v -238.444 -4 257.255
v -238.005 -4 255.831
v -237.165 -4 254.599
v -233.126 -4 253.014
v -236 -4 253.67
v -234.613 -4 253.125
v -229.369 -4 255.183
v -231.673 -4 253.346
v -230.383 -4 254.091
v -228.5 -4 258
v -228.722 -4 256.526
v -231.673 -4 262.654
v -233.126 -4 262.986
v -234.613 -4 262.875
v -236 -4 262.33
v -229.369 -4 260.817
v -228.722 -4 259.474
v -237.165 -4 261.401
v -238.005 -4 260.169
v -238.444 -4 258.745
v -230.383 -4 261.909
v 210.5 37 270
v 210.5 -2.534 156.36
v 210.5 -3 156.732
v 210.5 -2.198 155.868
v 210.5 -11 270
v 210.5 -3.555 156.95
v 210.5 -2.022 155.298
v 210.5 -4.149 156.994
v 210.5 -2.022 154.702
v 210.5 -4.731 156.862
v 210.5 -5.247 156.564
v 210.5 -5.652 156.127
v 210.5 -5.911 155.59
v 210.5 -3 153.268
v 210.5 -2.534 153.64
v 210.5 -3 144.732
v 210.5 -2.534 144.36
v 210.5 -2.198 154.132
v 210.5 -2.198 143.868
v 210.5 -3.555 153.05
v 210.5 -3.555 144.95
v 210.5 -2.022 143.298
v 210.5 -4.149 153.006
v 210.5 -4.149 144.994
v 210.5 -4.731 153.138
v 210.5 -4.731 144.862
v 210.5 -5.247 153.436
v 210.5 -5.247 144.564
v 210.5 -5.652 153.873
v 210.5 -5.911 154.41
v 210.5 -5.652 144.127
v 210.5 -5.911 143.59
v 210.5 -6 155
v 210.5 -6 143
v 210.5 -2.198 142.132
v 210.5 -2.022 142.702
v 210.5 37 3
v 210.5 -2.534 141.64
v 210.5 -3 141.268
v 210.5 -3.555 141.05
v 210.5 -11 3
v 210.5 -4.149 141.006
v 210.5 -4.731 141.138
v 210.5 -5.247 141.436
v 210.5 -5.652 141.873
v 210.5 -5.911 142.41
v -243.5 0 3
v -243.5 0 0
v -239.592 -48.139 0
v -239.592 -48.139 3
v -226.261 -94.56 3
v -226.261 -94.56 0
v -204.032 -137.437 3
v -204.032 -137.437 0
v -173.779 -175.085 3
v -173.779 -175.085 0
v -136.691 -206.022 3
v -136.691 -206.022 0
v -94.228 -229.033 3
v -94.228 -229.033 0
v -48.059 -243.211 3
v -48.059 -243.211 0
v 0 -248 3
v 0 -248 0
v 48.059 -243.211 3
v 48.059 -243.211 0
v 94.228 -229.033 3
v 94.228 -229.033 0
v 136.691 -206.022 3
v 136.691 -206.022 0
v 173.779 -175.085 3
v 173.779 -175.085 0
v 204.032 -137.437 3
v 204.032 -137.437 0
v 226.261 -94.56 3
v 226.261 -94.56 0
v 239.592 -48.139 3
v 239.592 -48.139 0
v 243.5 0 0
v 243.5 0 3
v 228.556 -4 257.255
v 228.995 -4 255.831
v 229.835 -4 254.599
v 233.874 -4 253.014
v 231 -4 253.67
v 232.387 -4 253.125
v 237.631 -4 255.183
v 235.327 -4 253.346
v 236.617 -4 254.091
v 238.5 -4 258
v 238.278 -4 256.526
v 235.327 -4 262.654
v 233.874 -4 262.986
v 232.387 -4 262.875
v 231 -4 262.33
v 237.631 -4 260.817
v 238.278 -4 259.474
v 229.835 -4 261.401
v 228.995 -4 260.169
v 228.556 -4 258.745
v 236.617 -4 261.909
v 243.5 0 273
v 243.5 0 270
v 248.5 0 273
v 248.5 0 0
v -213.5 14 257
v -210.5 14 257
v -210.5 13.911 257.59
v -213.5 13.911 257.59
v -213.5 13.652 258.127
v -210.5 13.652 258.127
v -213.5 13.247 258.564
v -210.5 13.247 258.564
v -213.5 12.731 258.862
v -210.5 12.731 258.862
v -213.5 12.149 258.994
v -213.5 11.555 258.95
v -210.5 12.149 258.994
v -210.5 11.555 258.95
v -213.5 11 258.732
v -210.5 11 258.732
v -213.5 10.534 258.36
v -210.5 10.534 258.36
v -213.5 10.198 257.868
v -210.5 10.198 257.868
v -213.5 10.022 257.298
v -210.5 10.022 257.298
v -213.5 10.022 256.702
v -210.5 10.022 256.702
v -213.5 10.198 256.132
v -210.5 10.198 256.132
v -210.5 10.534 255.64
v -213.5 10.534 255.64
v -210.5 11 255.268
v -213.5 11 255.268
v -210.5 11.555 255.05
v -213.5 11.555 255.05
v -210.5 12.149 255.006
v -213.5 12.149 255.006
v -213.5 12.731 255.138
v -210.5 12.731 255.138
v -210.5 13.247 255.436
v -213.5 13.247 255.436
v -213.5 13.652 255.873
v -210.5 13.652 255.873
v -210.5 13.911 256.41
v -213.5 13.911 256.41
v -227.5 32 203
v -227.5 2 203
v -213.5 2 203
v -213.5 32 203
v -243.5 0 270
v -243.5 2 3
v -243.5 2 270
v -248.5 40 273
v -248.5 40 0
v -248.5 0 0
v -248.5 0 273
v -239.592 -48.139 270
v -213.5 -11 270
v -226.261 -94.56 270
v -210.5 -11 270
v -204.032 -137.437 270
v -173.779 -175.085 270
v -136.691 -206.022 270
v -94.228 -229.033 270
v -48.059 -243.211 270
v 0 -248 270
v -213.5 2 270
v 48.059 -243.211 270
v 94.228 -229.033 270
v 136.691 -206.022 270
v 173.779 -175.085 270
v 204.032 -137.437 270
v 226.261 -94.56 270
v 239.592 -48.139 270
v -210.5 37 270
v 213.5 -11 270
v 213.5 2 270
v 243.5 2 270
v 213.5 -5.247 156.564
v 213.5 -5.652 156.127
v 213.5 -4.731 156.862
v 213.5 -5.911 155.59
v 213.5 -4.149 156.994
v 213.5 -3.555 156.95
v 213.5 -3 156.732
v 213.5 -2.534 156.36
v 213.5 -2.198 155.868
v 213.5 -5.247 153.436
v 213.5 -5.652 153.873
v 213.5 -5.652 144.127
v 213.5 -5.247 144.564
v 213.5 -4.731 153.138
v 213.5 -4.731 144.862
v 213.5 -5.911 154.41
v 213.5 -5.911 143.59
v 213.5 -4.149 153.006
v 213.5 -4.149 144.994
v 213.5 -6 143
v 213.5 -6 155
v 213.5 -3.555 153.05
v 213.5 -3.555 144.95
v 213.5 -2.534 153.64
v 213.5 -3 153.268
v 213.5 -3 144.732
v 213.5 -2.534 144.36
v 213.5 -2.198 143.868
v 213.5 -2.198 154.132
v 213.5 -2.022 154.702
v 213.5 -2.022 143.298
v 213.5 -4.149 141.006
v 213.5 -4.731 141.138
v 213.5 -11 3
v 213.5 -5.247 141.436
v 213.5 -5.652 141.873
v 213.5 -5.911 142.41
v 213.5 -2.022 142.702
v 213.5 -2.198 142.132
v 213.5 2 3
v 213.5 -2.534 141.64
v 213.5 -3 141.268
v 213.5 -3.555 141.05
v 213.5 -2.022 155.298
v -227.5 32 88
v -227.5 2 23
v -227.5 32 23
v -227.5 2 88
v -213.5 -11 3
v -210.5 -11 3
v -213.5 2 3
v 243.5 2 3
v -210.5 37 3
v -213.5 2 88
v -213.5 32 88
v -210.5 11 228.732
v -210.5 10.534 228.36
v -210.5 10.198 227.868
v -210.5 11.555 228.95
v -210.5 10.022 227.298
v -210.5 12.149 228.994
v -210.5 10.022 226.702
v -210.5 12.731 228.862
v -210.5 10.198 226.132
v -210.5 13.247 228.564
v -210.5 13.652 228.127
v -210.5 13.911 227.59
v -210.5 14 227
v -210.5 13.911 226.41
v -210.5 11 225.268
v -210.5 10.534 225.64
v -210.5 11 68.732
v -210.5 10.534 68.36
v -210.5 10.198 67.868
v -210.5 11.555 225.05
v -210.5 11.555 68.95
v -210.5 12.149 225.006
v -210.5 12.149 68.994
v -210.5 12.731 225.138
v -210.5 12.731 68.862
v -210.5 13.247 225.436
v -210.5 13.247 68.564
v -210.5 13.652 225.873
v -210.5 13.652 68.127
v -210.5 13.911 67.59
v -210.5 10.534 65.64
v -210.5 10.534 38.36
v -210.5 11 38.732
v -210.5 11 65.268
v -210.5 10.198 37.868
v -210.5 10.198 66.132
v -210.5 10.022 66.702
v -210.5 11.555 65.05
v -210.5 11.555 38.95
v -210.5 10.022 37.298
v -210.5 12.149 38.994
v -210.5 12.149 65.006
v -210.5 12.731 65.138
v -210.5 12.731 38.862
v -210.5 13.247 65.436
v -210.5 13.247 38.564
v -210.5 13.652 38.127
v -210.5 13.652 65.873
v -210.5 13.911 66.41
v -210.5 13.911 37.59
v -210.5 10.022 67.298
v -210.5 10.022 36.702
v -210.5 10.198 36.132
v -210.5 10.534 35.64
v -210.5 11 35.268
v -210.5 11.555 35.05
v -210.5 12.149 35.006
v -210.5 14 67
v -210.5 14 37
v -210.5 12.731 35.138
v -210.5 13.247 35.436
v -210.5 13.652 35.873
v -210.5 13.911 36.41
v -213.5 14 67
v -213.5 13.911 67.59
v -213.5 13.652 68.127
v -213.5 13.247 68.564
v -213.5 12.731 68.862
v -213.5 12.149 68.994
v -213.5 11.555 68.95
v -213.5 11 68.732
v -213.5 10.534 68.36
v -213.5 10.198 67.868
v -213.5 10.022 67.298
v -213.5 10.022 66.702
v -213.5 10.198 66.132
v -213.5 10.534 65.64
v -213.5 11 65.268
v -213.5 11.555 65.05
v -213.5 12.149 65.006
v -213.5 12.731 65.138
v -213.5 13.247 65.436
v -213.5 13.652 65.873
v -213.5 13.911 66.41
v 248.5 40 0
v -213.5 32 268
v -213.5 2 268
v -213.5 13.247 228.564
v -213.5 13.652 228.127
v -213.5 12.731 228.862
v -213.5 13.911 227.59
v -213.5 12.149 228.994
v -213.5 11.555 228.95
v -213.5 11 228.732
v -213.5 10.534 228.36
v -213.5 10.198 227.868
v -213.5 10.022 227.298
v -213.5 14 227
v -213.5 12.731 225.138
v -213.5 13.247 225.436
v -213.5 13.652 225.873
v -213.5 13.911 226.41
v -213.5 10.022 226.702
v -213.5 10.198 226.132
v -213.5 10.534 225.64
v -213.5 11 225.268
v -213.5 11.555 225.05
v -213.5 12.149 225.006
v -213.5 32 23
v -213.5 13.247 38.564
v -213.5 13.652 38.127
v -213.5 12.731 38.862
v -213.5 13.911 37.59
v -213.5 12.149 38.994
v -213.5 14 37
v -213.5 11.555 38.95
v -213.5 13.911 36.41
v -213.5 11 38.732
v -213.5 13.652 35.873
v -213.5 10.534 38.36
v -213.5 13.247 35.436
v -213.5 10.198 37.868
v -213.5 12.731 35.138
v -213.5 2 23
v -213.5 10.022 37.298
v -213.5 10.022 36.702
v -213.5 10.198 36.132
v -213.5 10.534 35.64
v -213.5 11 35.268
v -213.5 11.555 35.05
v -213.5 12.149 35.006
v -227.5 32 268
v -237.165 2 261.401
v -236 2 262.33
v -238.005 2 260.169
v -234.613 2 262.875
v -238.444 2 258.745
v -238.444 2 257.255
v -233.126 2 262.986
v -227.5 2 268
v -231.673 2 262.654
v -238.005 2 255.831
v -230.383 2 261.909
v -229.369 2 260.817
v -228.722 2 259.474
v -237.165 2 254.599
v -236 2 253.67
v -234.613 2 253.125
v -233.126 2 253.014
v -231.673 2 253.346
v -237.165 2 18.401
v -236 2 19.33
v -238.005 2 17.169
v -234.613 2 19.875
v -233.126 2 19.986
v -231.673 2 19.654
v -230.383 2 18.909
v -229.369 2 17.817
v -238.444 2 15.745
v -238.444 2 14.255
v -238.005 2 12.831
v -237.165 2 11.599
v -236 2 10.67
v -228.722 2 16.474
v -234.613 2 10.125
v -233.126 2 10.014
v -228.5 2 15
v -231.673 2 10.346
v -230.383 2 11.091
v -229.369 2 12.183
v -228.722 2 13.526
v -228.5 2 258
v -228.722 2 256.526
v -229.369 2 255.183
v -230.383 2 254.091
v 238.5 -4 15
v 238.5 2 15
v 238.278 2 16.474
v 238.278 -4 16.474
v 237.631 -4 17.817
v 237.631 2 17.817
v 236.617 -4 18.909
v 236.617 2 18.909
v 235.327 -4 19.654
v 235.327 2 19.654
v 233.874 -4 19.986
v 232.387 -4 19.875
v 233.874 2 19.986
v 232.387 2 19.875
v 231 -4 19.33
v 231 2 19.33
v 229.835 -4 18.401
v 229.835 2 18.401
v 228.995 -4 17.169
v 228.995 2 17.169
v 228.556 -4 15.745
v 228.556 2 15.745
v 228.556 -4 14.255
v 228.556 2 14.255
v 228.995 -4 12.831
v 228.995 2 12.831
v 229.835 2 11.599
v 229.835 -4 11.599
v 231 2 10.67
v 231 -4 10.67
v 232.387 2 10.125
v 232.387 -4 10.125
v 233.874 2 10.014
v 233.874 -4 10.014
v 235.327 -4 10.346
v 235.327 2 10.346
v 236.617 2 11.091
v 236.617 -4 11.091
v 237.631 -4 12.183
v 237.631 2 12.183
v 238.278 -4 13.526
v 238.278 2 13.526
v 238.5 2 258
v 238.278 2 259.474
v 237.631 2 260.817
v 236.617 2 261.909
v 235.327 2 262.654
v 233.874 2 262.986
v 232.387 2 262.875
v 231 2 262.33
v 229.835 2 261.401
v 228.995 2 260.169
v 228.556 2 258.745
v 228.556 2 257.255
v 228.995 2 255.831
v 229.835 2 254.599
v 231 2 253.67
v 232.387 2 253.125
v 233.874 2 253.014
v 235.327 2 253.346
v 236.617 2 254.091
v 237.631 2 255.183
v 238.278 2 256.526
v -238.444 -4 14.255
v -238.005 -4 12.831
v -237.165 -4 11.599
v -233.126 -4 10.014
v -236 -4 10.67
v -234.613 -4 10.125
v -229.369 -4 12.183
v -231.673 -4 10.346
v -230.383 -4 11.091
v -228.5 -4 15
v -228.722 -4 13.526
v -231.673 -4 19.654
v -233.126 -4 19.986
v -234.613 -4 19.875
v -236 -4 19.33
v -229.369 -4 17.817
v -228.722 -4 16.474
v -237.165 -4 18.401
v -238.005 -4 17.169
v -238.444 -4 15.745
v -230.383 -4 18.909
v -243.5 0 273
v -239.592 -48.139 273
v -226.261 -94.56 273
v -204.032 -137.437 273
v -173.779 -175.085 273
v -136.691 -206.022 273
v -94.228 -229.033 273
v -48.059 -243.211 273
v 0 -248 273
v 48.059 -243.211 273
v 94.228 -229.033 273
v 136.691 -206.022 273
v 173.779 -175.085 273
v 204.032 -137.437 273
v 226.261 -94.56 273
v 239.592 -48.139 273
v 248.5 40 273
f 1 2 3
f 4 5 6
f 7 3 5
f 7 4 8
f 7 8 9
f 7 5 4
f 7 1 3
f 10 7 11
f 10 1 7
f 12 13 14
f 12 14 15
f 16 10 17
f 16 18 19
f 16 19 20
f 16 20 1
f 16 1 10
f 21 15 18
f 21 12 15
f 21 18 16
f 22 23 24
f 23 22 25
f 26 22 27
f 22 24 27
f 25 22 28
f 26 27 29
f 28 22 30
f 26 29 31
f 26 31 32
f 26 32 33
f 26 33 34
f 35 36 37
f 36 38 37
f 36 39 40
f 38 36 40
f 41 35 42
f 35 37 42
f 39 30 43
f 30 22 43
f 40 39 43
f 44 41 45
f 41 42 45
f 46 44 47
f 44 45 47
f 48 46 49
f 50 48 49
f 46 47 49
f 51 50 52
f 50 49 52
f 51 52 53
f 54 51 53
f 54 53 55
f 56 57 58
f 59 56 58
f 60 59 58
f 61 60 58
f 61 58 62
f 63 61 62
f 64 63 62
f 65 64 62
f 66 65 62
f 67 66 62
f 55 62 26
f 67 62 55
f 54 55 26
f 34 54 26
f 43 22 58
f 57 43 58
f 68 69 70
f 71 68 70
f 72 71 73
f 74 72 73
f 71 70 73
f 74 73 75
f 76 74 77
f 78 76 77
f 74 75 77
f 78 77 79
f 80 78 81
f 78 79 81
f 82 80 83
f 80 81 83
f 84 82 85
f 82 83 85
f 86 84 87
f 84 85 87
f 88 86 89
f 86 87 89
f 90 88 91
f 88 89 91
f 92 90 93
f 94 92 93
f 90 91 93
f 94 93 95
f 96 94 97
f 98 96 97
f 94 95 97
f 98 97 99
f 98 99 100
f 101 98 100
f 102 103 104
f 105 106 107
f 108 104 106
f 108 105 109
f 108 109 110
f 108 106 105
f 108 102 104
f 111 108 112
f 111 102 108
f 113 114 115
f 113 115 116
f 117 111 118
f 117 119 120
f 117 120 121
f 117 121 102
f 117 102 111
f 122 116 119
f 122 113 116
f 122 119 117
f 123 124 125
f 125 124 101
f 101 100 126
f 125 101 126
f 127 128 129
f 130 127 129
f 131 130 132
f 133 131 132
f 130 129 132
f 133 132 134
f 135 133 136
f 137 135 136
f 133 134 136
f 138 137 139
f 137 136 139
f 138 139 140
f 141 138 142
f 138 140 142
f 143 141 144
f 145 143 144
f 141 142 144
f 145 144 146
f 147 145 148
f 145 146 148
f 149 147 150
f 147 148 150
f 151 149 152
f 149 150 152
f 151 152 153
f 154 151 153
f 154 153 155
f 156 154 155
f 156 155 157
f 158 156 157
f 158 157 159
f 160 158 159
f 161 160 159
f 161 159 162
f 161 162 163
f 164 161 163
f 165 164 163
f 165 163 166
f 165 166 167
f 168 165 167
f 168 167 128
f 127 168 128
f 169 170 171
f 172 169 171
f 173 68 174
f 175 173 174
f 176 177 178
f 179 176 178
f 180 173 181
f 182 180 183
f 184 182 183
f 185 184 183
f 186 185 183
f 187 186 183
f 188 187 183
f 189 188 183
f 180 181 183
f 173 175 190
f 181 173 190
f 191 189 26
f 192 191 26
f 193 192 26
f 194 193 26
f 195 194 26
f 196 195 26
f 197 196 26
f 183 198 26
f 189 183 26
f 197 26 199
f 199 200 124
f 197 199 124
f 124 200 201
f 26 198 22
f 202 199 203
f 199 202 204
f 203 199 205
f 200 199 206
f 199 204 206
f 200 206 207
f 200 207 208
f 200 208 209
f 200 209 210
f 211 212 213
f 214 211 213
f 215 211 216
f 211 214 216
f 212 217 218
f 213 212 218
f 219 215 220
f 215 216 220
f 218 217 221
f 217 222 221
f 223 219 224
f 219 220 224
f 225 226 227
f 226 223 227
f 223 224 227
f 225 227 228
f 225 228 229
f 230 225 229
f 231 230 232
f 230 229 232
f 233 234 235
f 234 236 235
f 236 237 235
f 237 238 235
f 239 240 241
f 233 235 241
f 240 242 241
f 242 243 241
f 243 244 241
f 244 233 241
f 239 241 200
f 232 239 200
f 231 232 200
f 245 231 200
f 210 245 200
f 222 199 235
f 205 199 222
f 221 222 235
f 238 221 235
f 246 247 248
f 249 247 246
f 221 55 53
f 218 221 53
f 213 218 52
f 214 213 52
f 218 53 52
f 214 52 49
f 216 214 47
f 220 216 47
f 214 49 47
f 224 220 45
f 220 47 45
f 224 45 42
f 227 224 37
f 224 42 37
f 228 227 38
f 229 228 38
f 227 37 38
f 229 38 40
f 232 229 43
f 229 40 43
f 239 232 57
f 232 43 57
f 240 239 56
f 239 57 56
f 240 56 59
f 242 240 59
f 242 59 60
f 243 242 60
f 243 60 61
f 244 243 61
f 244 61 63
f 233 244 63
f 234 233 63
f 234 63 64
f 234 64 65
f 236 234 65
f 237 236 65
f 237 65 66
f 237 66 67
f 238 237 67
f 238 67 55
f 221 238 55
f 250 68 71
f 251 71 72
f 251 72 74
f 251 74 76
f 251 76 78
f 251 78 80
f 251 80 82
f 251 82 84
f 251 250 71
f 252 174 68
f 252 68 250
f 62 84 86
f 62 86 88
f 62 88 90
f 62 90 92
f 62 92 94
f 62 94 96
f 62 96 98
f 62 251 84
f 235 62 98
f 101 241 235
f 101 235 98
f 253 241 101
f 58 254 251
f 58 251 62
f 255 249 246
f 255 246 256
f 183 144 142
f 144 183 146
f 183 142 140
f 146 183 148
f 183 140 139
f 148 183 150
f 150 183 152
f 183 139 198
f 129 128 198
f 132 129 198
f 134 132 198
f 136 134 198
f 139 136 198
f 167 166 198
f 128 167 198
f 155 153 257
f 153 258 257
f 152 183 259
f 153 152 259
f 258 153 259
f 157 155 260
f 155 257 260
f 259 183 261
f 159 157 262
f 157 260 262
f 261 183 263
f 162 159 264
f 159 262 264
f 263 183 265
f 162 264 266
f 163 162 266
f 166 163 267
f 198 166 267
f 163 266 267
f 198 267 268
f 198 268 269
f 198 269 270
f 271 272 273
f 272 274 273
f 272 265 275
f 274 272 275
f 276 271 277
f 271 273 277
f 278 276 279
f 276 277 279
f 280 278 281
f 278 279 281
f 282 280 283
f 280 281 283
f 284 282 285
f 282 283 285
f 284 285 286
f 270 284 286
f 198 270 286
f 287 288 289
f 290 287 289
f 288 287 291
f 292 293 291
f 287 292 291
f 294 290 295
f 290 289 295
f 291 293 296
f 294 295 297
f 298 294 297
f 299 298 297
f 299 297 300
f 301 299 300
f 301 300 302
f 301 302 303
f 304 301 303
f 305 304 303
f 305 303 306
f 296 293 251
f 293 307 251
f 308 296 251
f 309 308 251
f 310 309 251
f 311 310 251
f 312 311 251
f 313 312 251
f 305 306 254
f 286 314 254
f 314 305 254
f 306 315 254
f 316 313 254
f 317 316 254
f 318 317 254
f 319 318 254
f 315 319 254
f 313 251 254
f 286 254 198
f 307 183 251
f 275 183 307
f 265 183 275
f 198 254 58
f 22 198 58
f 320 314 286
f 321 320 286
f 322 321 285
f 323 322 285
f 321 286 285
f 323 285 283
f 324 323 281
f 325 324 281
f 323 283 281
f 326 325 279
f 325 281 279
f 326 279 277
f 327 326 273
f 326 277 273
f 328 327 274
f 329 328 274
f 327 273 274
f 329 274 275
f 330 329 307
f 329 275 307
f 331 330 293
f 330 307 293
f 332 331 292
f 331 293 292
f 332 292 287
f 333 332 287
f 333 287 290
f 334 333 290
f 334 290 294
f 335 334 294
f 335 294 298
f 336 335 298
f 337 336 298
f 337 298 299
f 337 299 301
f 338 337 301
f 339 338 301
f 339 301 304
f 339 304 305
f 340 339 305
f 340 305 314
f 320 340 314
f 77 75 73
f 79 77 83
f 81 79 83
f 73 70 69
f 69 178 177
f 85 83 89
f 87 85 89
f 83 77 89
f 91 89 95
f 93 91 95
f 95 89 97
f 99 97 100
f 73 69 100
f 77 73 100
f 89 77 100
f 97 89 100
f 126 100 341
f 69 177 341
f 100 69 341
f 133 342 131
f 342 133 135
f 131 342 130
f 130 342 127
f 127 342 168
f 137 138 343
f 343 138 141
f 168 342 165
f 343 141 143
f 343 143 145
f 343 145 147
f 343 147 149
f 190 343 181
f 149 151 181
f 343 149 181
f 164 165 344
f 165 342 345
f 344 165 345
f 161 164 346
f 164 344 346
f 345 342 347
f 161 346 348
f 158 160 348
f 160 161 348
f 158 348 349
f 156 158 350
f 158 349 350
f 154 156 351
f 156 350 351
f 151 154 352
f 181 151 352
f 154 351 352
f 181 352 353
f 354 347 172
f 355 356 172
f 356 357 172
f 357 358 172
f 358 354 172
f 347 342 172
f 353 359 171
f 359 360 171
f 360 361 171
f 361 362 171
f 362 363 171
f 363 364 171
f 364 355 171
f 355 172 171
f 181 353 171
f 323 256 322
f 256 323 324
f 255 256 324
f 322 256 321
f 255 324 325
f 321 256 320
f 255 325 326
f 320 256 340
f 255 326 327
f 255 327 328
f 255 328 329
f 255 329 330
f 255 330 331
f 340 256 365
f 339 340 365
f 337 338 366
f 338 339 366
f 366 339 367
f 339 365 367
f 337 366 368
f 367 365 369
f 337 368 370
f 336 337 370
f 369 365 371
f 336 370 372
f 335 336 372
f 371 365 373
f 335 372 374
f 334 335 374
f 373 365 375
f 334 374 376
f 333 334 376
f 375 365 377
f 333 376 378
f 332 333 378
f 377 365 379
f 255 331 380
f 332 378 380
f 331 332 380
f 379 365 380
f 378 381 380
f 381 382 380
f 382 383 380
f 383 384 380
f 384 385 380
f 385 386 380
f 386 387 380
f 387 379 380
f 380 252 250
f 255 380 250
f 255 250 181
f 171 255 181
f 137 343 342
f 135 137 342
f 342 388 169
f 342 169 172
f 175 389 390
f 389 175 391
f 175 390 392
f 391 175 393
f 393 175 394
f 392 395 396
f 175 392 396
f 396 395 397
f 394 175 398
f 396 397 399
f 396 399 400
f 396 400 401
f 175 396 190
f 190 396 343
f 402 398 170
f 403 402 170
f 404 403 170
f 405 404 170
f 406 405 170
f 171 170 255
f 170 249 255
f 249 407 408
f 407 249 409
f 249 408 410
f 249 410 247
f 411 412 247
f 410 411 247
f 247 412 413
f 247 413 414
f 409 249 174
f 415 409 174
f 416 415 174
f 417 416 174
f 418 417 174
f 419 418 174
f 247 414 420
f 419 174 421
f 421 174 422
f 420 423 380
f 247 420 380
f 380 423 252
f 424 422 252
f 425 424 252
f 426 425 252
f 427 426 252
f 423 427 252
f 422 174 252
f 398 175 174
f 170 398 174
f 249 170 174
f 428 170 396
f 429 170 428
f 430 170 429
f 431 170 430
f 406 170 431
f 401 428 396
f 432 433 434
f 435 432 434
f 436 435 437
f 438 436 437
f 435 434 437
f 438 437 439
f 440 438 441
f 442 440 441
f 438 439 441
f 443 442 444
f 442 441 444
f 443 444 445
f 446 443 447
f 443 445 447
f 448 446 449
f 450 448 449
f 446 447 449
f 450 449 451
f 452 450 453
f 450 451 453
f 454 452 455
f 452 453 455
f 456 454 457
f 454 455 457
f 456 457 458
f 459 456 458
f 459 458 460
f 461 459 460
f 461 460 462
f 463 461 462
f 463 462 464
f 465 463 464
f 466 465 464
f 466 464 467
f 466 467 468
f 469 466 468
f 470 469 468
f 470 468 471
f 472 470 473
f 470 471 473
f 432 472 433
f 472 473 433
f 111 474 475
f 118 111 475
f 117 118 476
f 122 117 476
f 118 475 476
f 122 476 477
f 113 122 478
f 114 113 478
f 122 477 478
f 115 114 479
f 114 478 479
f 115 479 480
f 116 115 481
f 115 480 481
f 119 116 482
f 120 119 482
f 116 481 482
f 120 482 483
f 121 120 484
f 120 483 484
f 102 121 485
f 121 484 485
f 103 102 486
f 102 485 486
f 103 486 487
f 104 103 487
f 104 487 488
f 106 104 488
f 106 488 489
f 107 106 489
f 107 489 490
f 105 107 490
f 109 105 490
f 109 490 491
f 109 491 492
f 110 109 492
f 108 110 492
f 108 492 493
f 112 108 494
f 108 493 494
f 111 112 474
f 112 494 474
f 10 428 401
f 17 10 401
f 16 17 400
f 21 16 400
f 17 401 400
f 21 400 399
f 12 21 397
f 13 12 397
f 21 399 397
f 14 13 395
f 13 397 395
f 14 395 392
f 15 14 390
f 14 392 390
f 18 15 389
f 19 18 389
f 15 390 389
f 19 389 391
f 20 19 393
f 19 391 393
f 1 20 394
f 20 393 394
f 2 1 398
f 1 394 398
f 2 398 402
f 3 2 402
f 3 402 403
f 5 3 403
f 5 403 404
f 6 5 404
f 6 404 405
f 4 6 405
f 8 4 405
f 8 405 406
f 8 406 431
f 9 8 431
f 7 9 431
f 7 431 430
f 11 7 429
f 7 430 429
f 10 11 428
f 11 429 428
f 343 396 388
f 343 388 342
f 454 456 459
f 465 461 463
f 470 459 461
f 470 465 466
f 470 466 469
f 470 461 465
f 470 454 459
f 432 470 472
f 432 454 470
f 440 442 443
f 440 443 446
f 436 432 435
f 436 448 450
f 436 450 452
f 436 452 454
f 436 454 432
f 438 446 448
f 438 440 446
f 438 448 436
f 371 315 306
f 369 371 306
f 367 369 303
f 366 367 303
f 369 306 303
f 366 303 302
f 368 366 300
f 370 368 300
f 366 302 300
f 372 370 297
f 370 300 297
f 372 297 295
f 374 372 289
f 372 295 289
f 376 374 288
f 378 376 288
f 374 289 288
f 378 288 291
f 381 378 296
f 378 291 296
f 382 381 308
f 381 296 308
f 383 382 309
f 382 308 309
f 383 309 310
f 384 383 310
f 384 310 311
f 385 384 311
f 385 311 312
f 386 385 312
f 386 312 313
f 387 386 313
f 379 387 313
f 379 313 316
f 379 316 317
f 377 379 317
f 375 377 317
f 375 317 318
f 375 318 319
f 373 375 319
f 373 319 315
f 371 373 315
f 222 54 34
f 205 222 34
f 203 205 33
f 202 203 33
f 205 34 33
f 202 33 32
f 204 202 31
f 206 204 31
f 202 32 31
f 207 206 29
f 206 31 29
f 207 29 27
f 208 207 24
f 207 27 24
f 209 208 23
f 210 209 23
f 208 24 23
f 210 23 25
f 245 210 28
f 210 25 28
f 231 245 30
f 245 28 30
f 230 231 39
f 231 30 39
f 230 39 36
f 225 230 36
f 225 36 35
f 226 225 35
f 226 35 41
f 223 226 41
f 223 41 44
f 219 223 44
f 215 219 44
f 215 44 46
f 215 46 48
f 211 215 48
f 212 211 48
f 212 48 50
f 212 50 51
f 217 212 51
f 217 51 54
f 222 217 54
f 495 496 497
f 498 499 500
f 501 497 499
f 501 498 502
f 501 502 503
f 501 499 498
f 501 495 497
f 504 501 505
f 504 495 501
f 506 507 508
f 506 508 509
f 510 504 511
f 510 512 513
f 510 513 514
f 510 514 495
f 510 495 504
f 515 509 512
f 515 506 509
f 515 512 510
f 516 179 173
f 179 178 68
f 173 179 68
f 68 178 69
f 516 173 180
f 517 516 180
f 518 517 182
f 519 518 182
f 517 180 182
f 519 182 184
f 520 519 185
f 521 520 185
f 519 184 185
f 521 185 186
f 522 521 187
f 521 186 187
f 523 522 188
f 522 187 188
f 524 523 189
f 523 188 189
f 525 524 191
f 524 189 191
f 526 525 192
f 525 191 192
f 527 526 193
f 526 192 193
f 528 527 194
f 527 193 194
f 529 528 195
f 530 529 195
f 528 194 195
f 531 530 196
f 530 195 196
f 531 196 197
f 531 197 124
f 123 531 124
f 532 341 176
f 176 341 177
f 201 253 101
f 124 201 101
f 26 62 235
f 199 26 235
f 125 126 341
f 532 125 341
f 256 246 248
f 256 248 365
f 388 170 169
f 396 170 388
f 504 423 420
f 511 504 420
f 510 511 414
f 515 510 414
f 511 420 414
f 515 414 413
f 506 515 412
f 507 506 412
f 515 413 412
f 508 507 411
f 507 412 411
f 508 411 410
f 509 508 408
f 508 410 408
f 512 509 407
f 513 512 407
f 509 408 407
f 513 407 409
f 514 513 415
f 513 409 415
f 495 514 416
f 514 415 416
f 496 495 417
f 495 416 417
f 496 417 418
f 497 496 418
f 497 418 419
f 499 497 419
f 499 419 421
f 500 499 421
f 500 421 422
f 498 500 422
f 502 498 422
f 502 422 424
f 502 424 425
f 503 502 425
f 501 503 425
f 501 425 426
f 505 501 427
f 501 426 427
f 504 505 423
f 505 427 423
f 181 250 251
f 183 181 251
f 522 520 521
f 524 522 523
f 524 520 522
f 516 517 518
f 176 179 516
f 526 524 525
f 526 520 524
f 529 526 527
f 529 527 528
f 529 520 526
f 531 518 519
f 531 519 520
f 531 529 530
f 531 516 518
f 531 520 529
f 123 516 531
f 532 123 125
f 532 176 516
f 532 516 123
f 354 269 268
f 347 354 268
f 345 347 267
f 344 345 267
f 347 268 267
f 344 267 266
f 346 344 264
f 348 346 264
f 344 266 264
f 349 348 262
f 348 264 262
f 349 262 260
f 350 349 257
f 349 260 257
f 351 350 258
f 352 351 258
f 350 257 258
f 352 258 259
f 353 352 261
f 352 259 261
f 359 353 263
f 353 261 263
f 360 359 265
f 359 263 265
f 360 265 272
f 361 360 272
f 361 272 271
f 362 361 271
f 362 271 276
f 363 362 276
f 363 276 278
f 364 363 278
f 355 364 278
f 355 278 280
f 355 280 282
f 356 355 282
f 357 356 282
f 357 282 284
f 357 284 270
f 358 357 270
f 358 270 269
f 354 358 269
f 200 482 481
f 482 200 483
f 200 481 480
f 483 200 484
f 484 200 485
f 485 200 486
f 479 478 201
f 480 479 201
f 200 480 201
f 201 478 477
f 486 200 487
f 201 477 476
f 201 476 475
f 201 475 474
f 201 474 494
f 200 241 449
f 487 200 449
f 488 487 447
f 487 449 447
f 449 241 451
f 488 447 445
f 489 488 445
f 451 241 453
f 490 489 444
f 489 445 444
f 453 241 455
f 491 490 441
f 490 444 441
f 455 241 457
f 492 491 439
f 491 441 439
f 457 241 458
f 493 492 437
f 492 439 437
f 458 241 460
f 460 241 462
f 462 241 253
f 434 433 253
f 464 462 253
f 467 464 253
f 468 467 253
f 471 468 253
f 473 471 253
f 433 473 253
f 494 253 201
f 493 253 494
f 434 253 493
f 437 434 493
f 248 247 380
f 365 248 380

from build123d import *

# Parameters (mm, degrees)
F1_DEPTH  = 3
F2_DEPTH  = 273
F3_START  = 267
F3_DEPTH  = 3
F4_W      = 14
F4_H      = 65
F5_DEPTH  = 30
F7_D      = 4
F7_DEPTH  = 8
F7_TIP    = 1.2017212381
F9_D      = 4
F9_DEPTH  = 8
F9_TIP    = 1.2017212381
F4_R      = 5
F10_DEPTH = 6


with BuildPart() as f1:
    # F0 (on Top) → F1 (new body)
    with BuildSketch(Plane.XY):
        with BuildLine():
            Line((-243.5, 2), (-243.5, 0))
            ThreePointArc((-243.5, 0), (0, -248), (243.5, 0))
            Line((243.5, 0), (243.5, 2))
            Line((243.5, 2), (213.5, 2))
            Line((213.5, 2), (213.5, -11))
            Line((213.5, -11), (210.5, -11))
            Line((210.5, -11), (210.5, 37))
            Line((210.5, 37), (-210.5, 37))
            Line((-210.5, 37), (-210.5, -11))
            Line((-210.5, -11), (-213.5, -11))
            Line((-213.5, -11), (-213.5, 2))
            Line((-213.5, 2), (-243.5, 2))
        make_face()
    extrude(amount=F1_DEPTH)

    # F0 (on Top) → F2 (join)
    with BuildSketch(Plane.XY):
        Polygon((248.5, 40), (-248.5, 40), (-248.5, 0), (-243.5, 0), (-243.5, 2), (-213.5, 2), (-213.5, -11), (-210.5, -11), (-210.5, 37), (210.5, 37), (210.5, -11), (213.5, -11), (213.5, 2), (243.5, 2), (243.5, 0), (248.5, 0), align=None)
    extrude(amount=F2_DEPTH)

    # F1_face (on face) → F3 (join)
    with BuildSketch(Plane(origin=(0, -87.9658672931, 3), x_dir=(1, 0, 0), z_dir=(0, 0, 1)).offset(F3_START)):
        with BuildLine():
            Line((-243.5, 89.9658672931), (-243.5, 87.9658672931))
            ThreePointArc((-243.5, 87.9658672931), (0, -160.0341327069), (243.5, 87.9658672931))
            Line((243.5, 87.9658672931), (243.5, 89.9658672931))
            Line((243.5, 89.9658672931), (213.5, 89.9658672931))
            Line((213.5, 89.9658672931), (213.5, 76.9658672931))
            Line((213.5, 76.9658672931), (210.5, 76.9658672931))
            Line((210.5, 76.9658672931), (210.5, 124.9658672931))
            Line((210.5, 124.9658672931), (-210.5, 124.9658672931))
            Line((-210.5, 124.9658672931), (-210.5, 76.9658672931))
            Line((-210.5, 76.9658672931), (-213.5, 76.9658672931))
            Line((-213.5, 76.9658672931), (-213.5, 89.9658672931))
            Line((-213.5, 89.9658672931), (-243.5, 89.9658672931))
        make_face()
    extrude(amount=F3_DEPTH)

    # F4 (on face) → F5 (cut)
    with BuildSketch(Plane.XZ.offset(-2)):
        with Locations((-220.5, 235.5)):
            Rectangle(F4_W, F4_H)
        with Locations((-220.5, 55.5)):
            Rectangle(F4_W, F4_H)
    extrude(amount=-F5_DEPTH, mode=Mode.SUBTRACT)

    # F7 (one way)
    with BuildSketch(Plane.YZ.offset(-210.5)):
        with Locations((12, 257), (12, 227), (12, 37), (12, 67)):
            Circle(F7_D / 2)
    extrude(amount=-F7_DEPTH, mode=Mode.SUBTRACT)
    with Locations(Plane.YZ.offset(-210.5)):
        with Locations((12, 257), (12, 227), (12, 37), (12, 67)):
            with Locations((0, 0, -(F7_DEPTH + F7_TIP / 2))):  # 118° drill point
                Cone(0, F7_D / 2, F7_TIP, mode=Mode.SUBTRACT)

    # F9 (one way)
    with BuildSketch(Plane(origin=(210.5, 0, 0), x_dir=(0, -1, 0), z_dir=(-1, 0, 0))):
        with Locations((4, 155), (4, 143)):
            Circle(F9_D / 2)
    extrude(amount=-F9_DEPTH, mode=Mode.SUBTRACT)
    with Locations(Plane(origin=(210.5, 0, 0), x_dir=(0, -1, 0), z_dir=(-1, 0, 0))):
        with Locations((4, 155), (4, 143)):
            with Locations((0, 0, -(F9_DEPTH + F9_TIP / 2))):  # 118° drill point
                Cone(0, F9_D / 2, F9_TIP, mode=Mode.SUBTRACT)

    # F4 (on face) → F10 (join)
    with BuildSketch(Plane.XZ.offset(-2)):
        with Locations((-233.5, 258)):
            Circle(F4_R)
        with Locations((-233.5, 15)):
            Circle(F4_R)
        with Locations((233.5, 15)):
            Circle(F4_R)
        with Locations((233.5, 258)):
            Circle(F4_R)
    extrude(amount=F10_DEPTH)


solid = f1.part
